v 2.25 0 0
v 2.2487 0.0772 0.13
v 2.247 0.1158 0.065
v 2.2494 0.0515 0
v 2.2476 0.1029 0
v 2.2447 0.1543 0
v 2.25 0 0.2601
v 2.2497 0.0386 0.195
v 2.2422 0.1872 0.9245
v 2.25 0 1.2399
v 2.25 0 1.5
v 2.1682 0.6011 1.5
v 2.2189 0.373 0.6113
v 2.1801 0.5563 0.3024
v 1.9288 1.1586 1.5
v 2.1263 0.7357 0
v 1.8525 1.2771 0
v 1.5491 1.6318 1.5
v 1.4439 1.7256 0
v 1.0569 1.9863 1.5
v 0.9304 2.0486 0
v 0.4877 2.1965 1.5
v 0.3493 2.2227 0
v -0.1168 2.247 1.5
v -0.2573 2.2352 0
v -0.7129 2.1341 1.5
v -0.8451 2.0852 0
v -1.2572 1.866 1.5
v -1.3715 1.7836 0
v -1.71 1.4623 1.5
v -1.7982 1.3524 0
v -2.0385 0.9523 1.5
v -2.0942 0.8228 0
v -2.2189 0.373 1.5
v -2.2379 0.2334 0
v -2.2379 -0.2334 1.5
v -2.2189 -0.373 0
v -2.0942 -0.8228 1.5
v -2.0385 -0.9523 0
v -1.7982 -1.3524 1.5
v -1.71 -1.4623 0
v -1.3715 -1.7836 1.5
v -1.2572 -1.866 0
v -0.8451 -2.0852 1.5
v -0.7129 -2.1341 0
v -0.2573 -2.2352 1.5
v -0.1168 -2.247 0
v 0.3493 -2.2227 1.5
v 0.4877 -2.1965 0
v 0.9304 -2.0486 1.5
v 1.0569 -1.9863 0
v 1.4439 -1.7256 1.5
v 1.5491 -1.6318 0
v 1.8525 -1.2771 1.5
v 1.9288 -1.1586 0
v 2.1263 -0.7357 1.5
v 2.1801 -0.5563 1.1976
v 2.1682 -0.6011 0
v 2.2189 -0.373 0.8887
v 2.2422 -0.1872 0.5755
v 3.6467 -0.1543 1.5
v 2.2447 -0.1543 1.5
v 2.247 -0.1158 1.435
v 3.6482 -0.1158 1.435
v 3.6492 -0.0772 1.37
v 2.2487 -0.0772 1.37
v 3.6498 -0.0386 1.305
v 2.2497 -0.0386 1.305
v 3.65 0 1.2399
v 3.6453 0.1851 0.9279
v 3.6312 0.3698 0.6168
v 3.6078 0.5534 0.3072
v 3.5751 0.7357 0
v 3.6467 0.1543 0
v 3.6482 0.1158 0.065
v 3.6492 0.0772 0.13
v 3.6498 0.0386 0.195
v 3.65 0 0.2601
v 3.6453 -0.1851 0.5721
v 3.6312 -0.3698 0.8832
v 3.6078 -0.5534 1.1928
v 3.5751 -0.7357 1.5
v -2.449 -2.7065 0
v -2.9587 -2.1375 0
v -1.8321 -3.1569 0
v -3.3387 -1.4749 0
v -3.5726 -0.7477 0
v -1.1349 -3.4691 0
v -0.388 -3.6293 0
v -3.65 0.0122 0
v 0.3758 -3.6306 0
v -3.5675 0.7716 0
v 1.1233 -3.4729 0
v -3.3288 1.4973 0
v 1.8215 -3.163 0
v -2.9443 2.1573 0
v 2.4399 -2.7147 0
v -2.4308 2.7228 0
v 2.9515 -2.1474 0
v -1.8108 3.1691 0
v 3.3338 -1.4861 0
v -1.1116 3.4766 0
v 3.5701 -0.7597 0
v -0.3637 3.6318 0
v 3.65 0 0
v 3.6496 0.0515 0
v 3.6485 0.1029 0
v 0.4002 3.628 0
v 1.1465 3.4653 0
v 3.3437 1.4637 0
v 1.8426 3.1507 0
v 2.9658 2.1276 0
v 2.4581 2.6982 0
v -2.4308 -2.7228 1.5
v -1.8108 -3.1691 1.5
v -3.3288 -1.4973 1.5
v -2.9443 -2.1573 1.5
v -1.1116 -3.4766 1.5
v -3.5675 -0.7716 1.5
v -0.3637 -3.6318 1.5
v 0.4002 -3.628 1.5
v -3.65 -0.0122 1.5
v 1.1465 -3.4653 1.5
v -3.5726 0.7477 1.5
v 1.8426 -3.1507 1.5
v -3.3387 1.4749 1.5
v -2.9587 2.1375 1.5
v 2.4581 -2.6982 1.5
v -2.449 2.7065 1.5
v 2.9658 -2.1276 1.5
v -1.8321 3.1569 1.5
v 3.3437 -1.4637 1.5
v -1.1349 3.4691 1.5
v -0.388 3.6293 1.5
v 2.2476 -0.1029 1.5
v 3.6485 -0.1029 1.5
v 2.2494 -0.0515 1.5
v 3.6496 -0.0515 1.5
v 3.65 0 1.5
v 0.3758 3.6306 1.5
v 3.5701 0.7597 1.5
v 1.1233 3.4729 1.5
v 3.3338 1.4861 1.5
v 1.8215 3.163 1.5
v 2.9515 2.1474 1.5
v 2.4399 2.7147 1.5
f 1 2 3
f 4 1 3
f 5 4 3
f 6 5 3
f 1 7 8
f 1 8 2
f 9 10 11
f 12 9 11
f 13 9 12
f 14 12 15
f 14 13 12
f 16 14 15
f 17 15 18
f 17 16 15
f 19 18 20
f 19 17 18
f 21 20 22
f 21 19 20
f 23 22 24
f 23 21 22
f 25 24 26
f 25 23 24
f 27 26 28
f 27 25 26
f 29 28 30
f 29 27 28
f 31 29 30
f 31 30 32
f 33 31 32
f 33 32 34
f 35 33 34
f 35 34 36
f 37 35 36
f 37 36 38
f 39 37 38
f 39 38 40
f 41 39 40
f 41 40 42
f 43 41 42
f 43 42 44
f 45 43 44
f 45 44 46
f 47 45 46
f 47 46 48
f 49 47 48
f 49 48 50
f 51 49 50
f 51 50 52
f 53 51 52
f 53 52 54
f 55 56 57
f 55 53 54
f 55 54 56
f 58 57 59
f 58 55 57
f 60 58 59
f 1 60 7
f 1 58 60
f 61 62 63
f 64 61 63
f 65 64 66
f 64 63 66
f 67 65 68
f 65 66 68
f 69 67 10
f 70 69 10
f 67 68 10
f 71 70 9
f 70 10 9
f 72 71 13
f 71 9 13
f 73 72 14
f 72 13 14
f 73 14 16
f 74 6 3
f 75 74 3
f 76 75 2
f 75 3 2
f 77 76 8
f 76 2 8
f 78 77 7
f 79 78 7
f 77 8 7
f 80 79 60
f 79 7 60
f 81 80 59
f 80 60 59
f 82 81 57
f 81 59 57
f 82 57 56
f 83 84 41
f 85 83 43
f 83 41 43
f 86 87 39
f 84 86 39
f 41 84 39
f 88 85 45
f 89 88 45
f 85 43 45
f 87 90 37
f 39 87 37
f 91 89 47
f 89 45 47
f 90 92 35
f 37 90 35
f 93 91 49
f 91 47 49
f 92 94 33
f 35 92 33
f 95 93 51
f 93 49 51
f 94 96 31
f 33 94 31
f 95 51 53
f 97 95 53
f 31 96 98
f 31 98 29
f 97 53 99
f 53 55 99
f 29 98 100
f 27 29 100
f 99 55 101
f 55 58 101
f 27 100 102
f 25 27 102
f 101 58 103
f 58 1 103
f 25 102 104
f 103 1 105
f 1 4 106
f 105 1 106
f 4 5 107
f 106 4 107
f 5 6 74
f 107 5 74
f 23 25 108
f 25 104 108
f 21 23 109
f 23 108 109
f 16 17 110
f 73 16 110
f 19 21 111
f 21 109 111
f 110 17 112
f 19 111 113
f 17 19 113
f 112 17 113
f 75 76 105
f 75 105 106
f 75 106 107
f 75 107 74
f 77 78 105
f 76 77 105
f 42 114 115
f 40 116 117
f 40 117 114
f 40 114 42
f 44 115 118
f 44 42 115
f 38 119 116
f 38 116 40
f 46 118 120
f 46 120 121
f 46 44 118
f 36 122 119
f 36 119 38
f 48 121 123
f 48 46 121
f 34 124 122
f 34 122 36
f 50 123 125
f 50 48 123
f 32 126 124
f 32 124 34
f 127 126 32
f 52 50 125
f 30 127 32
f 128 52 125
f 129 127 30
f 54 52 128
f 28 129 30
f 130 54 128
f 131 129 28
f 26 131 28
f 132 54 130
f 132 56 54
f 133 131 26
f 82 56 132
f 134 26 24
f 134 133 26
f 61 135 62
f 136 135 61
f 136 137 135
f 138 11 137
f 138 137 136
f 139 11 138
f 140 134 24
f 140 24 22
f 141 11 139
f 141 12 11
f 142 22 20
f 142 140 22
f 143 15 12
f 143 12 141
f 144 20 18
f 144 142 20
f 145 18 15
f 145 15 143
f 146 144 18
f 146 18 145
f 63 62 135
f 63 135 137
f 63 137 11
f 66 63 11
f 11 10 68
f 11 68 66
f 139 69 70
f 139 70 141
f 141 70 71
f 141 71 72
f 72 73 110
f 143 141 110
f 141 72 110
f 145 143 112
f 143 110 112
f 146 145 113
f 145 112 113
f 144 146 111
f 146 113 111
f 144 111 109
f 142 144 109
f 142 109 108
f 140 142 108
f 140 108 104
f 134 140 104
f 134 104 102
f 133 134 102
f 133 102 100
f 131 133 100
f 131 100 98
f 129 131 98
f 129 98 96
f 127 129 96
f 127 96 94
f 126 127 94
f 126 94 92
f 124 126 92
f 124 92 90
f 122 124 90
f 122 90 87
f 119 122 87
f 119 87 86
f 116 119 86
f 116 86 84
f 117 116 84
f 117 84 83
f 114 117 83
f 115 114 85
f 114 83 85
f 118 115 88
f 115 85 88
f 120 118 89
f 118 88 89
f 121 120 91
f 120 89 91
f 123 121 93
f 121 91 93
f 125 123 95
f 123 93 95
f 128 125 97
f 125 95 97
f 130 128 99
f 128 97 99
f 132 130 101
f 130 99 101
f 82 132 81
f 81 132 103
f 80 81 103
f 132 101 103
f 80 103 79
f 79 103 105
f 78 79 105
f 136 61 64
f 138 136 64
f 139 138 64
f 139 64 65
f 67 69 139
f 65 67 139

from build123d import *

# Parameters (mm, degrees)
ESQUISSE1_R             = 3.65
ESQUISSE1_R_2           = 2.25
BASE_EXTRUSION_DEPTH    = 1.5
ENL_V_MAT_EXTRU_1_DEPTH = 6.375406961


with BuildPart() as part:
    # Esquisse1 → Base-Extrusion (new body)
    with BuildSketch(Plane.XY):
        Circle(ESQUISSE1_R)
        Circle(ESQUISSE1_R_2, mode=Mode.SUBTRACT)
    extrude(amount=BASE_EXTRUSION_DEPTH)

    # Esquisse2 → Enlèv. mat.-Extru.1 (cut, through all)
    with BuildSketch(Plane(origin=(0, 0, 0), x_dir=(0, 0, -1), z_dir=(1, 0, 0))):
        Polygon((-1.5, -0.154321058), (0, 0.735714302), (0, 0.154321058), (-1.5, -0.735714302), align=None)
    extrude(amount=ENL_V_MAT_EXTRU_1_DEPTH, mode=Mode.SUBTRACT)


solid = part.part
